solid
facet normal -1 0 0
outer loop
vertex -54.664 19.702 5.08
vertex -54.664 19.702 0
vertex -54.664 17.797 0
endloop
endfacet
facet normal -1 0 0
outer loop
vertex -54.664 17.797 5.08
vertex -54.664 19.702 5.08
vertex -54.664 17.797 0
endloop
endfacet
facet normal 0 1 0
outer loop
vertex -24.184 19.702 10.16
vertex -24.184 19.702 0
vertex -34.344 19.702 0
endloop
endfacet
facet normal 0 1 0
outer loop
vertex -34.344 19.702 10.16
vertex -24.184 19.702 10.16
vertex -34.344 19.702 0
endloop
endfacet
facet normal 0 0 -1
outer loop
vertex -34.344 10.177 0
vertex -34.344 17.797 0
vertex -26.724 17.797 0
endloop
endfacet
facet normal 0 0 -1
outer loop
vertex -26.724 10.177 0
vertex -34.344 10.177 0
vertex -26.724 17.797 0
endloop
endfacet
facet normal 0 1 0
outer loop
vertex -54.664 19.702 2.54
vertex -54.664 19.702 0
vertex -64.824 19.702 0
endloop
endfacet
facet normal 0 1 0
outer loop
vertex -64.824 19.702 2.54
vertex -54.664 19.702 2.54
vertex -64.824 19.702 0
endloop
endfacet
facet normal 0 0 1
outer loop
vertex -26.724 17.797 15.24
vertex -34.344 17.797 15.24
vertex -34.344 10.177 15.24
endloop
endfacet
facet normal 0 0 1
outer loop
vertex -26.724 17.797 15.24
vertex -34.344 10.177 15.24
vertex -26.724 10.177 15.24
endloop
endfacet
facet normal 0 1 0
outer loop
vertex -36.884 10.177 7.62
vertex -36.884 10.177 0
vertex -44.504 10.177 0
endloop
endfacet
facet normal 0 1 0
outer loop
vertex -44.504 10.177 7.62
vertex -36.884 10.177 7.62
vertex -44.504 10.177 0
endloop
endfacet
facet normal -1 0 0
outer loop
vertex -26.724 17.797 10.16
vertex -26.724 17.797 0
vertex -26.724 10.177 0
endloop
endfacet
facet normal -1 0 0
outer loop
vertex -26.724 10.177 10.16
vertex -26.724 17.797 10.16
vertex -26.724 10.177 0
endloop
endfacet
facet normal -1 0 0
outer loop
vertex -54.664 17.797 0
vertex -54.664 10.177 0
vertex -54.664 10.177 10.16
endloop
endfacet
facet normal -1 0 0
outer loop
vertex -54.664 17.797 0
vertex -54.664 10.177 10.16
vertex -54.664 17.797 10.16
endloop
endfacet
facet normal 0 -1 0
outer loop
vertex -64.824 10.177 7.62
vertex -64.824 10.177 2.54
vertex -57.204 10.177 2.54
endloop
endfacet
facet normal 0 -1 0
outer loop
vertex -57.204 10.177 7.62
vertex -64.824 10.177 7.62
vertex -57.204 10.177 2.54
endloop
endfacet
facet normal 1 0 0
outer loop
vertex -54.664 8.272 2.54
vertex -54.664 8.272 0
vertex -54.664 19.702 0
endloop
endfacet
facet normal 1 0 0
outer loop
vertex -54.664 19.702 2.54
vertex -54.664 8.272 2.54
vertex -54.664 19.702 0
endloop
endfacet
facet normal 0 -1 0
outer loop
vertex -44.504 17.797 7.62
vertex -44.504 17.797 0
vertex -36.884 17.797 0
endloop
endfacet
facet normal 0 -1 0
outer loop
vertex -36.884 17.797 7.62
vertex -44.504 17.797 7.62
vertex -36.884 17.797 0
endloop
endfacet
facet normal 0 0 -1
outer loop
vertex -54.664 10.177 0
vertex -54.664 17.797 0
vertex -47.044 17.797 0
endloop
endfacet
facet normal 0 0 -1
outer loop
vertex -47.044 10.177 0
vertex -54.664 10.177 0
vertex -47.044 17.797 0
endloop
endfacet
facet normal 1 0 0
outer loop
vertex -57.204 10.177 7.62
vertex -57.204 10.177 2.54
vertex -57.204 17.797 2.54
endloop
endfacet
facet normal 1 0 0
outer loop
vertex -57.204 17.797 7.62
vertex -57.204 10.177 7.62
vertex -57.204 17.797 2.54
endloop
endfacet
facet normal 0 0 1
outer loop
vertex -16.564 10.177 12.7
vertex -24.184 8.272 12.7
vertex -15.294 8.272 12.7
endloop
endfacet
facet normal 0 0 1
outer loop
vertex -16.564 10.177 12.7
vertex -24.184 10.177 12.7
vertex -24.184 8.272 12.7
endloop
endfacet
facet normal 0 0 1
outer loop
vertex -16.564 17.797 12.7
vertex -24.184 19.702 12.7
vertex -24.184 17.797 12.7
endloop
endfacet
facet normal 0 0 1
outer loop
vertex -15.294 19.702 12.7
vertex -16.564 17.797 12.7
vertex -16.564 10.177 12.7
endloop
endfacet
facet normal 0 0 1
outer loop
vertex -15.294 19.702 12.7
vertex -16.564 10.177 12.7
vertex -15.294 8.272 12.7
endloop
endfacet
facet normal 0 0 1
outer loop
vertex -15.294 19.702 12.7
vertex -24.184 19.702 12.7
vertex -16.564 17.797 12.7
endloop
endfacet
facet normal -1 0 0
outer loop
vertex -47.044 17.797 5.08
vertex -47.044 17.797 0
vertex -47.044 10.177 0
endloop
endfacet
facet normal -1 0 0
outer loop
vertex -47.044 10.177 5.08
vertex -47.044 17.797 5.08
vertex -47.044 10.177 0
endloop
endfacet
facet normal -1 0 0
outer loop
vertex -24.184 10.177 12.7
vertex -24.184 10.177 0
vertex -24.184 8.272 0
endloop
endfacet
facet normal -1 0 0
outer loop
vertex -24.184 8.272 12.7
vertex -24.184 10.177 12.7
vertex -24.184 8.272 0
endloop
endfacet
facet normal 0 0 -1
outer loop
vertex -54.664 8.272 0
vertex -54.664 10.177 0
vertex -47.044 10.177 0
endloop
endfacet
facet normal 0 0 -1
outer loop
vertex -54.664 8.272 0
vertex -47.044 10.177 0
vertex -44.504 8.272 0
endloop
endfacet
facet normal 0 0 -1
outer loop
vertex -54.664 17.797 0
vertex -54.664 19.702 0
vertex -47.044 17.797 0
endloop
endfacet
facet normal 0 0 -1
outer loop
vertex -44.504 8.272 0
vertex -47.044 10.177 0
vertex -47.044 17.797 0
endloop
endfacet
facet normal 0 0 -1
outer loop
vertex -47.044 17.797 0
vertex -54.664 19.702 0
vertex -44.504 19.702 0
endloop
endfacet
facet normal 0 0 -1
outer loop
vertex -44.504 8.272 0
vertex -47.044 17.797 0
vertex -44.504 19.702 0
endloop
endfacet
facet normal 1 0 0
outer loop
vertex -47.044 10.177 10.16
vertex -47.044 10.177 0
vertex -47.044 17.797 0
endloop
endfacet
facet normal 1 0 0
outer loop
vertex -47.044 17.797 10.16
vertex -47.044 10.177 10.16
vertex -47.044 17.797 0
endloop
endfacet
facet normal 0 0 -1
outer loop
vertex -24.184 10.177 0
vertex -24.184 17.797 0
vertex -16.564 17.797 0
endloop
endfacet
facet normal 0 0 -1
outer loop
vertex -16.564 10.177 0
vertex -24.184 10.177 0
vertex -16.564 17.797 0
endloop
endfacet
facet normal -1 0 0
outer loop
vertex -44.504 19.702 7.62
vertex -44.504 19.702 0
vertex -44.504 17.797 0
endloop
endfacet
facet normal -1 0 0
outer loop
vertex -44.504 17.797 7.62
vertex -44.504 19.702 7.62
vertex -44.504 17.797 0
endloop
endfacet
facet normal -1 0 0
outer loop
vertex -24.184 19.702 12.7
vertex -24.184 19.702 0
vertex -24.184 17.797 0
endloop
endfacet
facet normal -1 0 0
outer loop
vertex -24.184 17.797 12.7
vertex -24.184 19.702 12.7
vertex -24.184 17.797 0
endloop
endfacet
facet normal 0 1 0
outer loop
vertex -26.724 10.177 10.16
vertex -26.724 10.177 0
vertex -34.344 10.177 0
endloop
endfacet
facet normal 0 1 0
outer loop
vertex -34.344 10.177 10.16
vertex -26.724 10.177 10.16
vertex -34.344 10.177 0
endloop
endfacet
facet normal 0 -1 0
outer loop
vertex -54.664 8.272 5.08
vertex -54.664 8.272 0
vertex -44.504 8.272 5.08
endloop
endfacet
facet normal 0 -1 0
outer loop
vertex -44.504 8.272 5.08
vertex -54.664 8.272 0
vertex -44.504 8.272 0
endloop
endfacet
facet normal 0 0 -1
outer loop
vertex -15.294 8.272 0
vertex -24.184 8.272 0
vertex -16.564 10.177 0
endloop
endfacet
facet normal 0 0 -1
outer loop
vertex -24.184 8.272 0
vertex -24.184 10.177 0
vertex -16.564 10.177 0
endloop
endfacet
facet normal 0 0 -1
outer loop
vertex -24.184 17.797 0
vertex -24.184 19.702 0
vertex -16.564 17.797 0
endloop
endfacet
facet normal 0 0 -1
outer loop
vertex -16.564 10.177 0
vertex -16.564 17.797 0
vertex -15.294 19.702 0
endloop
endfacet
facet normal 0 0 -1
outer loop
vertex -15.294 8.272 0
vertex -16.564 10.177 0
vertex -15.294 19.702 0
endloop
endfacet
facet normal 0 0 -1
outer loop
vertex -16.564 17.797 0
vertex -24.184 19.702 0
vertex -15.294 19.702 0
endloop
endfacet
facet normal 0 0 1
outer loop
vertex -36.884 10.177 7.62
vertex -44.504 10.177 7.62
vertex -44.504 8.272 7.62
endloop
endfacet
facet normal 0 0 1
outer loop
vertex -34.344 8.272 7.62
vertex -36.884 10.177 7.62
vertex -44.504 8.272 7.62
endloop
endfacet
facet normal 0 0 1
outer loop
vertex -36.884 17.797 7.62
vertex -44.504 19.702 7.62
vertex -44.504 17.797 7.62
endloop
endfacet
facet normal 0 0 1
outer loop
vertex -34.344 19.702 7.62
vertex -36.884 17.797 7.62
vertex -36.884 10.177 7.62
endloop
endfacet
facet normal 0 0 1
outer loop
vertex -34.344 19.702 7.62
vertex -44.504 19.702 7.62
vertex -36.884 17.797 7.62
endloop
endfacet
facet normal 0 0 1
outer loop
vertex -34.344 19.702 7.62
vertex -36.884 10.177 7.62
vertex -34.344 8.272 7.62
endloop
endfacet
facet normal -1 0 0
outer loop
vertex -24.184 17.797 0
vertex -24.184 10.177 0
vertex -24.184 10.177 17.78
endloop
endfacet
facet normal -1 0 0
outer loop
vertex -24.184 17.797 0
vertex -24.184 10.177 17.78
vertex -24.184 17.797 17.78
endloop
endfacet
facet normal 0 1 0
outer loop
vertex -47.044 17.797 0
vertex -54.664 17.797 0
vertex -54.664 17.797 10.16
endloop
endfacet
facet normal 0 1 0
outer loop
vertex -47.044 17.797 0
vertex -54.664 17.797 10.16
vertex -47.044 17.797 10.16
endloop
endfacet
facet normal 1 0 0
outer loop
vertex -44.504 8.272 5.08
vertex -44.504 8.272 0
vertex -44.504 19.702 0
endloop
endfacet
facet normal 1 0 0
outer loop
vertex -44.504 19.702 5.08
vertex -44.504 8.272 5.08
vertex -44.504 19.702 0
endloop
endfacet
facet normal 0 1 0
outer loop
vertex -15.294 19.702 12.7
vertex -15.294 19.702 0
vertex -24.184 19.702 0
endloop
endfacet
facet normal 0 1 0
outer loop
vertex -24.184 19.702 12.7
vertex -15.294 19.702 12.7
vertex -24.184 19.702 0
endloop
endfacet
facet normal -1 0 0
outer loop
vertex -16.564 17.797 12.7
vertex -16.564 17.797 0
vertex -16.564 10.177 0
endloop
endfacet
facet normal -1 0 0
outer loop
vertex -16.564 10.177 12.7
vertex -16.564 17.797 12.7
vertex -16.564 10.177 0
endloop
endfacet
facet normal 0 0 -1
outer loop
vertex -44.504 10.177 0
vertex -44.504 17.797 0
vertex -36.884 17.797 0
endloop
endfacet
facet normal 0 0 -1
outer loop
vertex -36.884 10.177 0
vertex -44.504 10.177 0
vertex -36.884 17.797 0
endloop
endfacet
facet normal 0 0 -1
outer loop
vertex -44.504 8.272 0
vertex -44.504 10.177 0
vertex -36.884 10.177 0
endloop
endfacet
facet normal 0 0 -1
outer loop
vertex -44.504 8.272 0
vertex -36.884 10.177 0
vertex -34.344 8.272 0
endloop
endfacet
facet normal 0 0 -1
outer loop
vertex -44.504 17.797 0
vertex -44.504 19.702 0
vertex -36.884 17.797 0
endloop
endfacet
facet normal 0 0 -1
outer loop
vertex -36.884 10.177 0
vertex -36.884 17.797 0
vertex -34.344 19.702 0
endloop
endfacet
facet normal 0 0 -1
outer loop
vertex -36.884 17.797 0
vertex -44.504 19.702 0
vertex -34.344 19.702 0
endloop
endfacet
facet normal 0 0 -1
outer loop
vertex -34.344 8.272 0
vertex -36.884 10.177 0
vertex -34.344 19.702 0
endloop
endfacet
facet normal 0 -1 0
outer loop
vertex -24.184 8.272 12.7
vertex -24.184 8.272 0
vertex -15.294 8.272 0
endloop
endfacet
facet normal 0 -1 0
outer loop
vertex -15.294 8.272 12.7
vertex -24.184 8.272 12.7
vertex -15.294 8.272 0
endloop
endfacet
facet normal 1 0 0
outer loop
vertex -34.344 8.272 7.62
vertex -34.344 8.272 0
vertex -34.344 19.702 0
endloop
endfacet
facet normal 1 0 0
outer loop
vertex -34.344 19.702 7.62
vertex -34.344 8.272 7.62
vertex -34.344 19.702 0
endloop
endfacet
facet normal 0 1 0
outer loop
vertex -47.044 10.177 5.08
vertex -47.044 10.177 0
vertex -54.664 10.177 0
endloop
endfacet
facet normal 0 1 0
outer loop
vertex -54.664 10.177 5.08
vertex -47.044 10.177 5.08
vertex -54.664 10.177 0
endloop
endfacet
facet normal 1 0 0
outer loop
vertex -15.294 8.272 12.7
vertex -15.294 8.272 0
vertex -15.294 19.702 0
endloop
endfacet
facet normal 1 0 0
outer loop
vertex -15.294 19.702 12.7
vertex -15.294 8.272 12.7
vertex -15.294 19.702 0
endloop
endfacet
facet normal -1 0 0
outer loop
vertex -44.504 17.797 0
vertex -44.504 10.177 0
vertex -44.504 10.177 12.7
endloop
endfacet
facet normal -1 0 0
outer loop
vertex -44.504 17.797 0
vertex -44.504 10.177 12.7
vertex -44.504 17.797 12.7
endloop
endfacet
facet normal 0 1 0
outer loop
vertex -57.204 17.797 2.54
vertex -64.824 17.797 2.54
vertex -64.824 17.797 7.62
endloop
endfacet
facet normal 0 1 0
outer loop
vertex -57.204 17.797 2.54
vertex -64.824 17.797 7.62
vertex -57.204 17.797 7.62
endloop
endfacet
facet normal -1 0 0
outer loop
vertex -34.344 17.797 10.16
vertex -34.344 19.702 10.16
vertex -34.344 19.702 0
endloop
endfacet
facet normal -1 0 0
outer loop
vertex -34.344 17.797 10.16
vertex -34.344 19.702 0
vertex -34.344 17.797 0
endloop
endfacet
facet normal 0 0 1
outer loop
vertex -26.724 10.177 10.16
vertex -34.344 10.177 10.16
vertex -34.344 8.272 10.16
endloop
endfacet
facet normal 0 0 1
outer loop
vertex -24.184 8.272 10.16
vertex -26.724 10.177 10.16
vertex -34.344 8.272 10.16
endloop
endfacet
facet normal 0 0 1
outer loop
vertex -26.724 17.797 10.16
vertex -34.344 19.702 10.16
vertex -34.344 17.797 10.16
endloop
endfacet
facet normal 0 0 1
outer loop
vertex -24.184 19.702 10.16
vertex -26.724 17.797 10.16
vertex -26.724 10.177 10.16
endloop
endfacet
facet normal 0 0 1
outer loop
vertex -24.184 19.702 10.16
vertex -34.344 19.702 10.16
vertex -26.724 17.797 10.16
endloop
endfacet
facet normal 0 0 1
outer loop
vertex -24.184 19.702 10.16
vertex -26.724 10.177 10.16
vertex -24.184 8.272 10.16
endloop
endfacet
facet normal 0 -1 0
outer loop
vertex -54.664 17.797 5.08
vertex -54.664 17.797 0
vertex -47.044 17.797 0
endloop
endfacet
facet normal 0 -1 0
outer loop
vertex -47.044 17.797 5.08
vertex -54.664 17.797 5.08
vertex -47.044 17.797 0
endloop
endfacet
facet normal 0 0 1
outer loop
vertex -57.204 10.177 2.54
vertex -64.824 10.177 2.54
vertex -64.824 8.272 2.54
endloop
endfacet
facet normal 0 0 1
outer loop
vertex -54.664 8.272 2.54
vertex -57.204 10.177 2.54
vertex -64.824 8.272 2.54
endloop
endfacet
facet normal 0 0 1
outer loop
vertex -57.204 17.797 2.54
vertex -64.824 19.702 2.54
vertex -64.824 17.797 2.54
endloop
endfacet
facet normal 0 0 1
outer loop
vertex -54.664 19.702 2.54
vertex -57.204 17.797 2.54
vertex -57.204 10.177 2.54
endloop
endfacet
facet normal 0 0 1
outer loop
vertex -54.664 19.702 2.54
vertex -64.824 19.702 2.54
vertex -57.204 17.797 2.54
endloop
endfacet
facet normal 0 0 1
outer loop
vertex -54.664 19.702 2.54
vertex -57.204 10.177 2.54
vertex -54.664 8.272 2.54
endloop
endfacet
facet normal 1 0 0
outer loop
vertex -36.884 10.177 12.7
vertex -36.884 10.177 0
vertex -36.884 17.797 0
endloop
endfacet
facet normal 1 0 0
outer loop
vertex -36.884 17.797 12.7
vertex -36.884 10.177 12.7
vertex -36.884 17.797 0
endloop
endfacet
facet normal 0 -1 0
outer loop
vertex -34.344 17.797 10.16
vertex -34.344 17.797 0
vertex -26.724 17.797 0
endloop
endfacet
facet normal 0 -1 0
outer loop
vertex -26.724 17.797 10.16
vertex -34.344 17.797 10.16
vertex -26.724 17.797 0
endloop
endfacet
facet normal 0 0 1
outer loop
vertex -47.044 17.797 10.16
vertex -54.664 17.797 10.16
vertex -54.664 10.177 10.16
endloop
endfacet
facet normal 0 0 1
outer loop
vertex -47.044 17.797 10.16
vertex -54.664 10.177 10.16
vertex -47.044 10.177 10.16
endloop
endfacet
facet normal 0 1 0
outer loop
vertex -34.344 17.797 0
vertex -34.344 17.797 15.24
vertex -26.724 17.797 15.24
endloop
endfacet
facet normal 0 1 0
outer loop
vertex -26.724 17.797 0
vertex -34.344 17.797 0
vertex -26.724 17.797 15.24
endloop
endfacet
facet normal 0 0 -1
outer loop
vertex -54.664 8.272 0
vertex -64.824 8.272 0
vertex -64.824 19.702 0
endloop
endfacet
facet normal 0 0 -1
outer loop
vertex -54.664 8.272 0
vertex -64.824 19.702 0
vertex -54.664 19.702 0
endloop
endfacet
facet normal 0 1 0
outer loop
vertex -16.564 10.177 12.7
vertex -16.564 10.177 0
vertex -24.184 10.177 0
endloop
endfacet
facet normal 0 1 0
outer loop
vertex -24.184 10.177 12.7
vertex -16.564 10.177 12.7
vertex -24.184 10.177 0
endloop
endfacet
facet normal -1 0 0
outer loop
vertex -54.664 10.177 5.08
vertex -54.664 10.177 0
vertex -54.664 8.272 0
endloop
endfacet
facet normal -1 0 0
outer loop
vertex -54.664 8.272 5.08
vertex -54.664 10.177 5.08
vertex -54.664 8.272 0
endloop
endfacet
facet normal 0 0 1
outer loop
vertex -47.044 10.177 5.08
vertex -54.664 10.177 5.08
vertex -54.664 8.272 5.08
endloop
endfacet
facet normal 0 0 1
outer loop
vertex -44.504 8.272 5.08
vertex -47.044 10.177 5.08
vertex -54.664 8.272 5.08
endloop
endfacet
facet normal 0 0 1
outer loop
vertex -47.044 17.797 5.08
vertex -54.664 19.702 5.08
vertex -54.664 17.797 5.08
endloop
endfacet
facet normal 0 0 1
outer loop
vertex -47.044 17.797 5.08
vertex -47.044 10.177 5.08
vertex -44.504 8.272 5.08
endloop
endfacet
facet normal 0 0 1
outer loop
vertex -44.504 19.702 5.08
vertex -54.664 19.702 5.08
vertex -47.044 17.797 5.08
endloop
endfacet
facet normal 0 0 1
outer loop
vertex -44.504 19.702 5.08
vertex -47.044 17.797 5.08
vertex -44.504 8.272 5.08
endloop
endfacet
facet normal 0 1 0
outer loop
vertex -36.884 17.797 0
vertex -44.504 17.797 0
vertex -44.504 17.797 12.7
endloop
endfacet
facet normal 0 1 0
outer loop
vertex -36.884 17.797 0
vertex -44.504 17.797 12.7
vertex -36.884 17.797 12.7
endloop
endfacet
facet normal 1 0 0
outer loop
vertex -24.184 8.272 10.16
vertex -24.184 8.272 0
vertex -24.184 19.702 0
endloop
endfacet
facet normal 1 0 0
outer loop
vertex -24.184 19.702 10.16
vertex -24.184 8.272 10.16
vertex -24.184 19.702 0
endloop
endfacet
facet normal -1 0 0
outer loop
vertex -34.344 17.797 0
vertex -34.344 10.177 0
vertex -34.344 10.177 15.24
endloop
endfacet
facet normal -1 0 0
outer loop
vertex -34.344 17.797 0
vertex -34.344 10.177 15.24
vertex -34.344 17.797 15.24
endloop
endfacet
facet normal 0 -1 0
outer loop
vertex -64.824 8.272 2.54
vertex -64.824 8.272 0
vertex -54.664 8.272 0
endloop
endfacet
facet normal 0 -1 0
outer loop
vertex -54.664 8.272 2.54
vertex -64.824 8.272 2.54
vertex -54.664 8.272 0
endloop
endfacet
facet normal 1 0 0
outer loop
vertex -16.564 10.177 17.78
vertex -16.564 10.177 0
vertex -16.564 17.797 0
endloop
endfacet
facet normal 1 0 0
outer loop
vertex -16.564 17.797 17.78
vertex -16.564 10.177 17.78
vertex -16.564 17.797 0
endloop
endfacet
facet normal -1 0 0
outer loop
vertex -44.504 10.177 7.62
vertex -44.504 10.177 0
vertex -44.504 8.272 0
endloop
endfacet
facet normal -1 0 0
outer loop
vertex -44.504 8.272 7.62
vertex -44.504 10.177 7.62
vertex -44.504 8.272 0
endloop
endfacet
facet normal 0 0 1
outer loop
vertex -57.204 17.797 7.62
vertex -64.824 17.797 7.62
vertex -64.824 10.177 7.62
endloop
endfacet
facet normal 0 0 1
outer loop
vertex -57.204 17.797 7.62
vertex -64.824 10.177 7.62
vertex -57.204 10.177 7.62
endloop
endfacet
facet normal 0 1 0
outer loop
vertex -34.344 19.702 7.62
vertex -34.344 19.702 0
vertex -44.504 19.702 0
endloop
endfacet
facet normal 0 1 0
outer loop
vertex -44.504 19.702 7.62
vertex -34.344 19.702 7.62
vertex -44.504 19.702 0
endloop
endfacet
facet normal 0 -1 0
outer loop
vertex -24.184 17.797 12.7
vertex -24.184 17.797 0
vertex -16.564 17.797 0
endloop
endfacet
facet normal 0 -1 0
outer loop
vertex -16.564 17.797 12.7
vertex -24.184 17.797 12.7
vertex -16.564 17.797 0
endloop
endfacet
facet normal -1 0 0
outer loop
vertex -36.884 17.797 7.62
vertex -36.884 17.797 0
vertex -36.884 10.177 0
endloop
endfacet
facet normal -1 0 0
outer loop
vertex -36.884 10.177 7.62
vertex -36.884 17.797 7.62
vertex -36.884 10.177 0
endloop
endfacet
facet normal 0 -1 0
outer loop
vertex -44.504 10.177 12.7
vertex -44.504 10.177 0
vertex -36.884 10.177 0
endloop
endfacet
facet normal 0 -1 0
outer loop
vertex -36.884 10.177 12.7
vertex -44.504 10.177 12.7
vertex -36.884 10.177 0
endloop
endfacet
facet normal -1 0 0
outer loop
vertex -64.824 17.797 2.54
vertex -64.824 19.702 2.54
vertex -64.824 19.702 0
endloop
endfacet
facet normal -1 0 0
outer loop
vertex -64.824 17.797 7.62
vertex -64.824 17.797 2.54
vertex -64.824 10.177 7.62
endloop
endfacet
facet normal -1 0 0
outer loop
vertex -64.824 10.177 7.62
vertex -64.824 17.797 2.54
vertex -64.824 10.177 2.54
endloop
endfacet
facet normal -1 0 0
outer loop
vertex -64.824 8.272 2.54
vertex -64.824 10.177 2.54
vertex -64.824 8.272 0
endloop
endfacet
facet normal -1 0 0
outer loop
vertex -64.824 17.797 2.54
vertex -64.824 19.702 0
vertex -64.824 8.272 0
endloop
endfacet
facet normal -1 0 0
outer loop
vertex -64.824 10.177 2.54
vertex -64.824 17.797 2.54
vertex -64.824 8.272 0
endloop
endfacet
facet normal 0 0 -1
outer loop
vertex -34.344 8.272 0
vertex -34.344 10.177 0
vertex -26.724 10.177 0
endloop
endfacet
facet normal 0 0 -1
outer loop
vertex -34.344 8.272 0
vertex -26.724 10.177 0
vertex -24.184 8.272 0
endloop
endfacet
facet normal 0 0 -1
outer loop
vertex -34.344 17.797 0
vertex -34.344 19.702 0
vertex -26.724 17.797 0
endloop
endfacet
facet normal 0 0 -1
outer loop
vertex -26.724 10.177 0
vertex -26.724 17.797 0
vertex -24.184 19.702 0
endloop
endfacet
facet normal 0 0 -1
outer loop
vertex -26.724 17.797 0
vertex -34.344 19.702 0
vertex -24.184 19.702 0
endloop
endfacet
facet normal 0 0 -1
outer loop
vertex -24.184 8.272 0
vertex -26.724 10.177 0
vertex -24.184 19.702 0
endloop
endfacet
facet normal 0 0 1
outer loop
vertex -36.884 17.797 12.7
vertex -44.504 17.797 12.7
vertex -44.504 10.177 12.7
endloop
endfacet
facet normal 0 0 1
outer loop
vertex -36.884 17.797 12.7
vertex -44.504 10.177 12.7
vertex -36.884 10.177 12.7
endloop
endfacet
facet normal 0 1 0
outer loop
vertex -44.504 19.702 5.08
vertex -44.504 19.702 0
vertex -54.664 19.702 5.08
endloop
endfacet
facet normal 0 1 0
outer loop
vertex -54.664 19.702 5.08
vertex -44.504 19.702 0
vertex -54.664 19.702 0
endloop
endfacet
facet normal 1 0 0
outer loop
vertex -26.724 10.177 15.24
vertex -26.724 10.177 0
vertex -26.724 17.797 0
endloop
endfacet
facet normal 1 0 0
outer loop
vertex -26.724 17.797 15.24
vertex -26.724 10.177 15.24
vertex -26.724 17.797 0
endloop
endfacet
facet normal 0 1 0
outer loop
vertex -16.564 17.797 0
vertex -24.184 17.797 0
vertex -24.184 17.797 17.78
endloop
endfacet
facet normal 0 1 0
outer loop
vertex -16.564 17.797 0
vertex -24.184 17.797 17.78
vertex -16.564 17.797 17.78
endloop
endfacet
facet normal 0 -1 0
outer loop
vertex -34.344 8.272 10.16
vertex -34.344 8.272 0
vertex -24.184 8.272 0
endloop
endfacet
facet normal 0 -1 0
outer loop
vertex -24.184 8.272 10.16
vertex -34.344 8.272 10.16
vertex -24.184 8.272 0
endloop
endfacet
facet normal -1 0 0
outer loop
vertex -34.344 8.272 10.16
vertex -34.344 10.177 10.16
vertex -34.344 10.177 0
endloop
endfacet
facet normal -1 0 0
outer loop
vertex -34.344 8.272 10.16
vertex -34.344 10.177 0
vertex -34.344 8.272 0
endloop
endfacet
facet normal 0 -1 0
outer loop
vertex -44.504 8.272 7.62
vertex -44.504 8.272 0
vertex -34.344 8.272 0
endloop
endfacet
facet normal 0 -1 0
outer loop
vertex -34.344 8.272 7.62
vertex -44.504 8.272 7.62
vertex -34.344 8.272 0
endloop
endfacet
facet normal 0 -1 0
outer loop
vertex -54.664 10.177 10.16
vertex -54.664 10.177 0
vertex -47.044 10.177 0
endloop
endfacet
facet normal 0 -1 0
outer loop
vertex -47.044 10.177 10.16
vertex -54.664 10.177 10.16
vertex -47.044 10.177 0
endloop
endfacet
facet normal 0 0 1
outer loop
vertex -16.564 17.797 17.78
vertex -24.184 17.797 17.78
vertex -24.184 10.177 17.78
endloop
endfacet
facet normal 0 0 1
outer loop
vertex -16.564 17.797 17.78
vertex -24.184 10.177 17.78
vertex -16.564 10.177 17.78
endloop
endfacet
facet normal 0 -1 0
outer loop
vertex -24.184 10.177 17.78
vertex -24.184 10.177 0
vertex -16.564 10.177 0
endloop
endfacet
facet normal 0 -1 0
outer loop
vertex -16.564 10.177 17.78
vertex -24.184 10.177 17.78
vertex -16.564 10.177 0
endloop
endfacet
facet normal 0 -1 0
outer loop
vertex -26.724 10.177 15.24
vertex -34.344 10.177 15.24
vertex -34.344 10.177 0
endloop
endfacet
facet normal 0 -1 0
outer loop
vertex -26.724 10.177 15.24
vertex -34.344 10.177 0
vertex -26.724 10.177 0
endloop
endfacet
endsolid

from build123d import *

# Parameters (mm, degrees)
F0_W      = 7.62
F0_H      = 7.62
F1_DEPTH  = 7.62
F2_DEPTH  = 2.54
F3_DEPTH  = 10.16
F4_DEPTH  = 5.08
F5_DEPTH  = 12.7
F6_DEPTH  = 7.62
F7_DEPTH  = 15.24
F8_DEPTH  = 10.16
F9_DEPTH  = 17.78
F10_DEPTH = 12.7


with BuildPart() as f1:
    # F0 (on Top) → F1 (new body)
    with BuildSketch(Plane.XY):
        with Locations((-61.013542, 13.986675)):
            Rectangle(F0_W, F0_H)
    extrude(amount=F1_DEPTH)

    # F0 (on Top) → F2 (join)
    with BuildSketch(Plane.XY):
        Polygon((-64.823542, 8.271675), (-54.663542, 8.271675), (-54.663542, 10.176675), (-54.663542, 17.796675), (-54.663542, 19.701675), (-64.823542, 19.701675), (-64.823542, 17.796675), (-57.203542, 17.796675), (-57.203542, 10.176675), (-64.823542, 10.176675), align=None)
    extrude(amount=F2_DEPTH)


with BuildPart() as f3:
    # F0 (on Top) → F3 (new body)
    with BuildSketch(Plane.XY):
        with Locations((-50.853542, 13.986675)):
            Rectangle(F0_W, F0_H)
    extrude(amount=F3_DEPTH)


with BuildPart() as f4:
    # F0 (on Top) → F4 (new body)
    with BuildSketch(Plane.XY):
        Polygon((-54.663542, 8.271675), (-44.503542, 8.271675), (-44.503542, 10.176675), (-44.503542, 17.796675), (-44.503542, 19.701675), (-54.663542, 19.701675), (-54.663542, 17.796675), (-47.043542, 17.796675), (-47.043542, 10.176675), (-54.663542, 10.176675), align=None)
    extrude(amount=F4_DEPTH)


with BuildPart() as f5:
    # F0 (on Top) → F5 (new body)
    with BuildSketch(Plane.XY):
        with Locations((-40.693542, 13.986675)):
            Rectangle(F0_W, F0_H)
    extrude(amount=F5_DEPTH)


with BuildPart() as f6:
    # F0 (on Top) → F6 (new body)
    with BuildSketch(Plane.XY):
        Polygon((-44.503542, 8.271675), (-34.343542, 8.271675), (-34.343542, 10.176675), (-34.343542, 17.796675), (-34.343542, 19.701675), (-44.503542, 19.701675), (-44.503542, 17.796675), (-36.883542, 17.796675), (-36.883542, 10.176675), (-44.503542, 10.176675), align=None)
    extrude(amount=F6_DEPTH)


with BuildPart() as f7:
    # F0 (on Top) → F7 (new body)
    with BuildSketch(Plane.XY):
        with Locations((-30.533542, 13.986675)):
            Rectangle(F0_W, F0_H)
    extrude(amount=F7_DEPTH)


with BuildPart() as f8:
    # F0 (on Top) → F8 (new body)
    with BuildSketch(Plane.XY):
        Polygon((-34.343542, 8.271675), (-24.183542, 8.271675), (-24.183542, 10.176675), (-24.183542, 17.796675), (-24.183542, 19.701675), (-34.343542, 19.701675), (-34.343542, 17.796675), (-26.723542, 17.796675), (-26.723542, 10.176675), (-34.343542, 10.176675), align=None)
    extrude(amount=F8_DEPTH)


with BuildPart() as f9:
    # F0 (on Top) → F9 (new body)
    with BuildSketch(Plane.XY):
        with Locations((-20.373542, 13.986675)):
            Rectangle(F0_W, F0_H)
    extrude(amount=F9_DEPTH)


with BuildPart() as f10:
    # F0 (on Top) → F10 (new body)
    with BuildSketch(Plane.XY):
        Polygon((-24.183542, 8.271675), (-15.293542, 8.271675), (-15.293542, 19.701675), (-24.183542, 19.701675), (-24.183542, 17.796675), (-16.563542, 17.796675), (-16.563542, 10.176675), (-24.183542, 10.176675), align=None)
    extrude(amount=F10_DEPTH)


solid = Compound([f1.part, f3.part, f4.part, f5.part, f6.part, f7.part, f8.part, f9.part, f10.part])
